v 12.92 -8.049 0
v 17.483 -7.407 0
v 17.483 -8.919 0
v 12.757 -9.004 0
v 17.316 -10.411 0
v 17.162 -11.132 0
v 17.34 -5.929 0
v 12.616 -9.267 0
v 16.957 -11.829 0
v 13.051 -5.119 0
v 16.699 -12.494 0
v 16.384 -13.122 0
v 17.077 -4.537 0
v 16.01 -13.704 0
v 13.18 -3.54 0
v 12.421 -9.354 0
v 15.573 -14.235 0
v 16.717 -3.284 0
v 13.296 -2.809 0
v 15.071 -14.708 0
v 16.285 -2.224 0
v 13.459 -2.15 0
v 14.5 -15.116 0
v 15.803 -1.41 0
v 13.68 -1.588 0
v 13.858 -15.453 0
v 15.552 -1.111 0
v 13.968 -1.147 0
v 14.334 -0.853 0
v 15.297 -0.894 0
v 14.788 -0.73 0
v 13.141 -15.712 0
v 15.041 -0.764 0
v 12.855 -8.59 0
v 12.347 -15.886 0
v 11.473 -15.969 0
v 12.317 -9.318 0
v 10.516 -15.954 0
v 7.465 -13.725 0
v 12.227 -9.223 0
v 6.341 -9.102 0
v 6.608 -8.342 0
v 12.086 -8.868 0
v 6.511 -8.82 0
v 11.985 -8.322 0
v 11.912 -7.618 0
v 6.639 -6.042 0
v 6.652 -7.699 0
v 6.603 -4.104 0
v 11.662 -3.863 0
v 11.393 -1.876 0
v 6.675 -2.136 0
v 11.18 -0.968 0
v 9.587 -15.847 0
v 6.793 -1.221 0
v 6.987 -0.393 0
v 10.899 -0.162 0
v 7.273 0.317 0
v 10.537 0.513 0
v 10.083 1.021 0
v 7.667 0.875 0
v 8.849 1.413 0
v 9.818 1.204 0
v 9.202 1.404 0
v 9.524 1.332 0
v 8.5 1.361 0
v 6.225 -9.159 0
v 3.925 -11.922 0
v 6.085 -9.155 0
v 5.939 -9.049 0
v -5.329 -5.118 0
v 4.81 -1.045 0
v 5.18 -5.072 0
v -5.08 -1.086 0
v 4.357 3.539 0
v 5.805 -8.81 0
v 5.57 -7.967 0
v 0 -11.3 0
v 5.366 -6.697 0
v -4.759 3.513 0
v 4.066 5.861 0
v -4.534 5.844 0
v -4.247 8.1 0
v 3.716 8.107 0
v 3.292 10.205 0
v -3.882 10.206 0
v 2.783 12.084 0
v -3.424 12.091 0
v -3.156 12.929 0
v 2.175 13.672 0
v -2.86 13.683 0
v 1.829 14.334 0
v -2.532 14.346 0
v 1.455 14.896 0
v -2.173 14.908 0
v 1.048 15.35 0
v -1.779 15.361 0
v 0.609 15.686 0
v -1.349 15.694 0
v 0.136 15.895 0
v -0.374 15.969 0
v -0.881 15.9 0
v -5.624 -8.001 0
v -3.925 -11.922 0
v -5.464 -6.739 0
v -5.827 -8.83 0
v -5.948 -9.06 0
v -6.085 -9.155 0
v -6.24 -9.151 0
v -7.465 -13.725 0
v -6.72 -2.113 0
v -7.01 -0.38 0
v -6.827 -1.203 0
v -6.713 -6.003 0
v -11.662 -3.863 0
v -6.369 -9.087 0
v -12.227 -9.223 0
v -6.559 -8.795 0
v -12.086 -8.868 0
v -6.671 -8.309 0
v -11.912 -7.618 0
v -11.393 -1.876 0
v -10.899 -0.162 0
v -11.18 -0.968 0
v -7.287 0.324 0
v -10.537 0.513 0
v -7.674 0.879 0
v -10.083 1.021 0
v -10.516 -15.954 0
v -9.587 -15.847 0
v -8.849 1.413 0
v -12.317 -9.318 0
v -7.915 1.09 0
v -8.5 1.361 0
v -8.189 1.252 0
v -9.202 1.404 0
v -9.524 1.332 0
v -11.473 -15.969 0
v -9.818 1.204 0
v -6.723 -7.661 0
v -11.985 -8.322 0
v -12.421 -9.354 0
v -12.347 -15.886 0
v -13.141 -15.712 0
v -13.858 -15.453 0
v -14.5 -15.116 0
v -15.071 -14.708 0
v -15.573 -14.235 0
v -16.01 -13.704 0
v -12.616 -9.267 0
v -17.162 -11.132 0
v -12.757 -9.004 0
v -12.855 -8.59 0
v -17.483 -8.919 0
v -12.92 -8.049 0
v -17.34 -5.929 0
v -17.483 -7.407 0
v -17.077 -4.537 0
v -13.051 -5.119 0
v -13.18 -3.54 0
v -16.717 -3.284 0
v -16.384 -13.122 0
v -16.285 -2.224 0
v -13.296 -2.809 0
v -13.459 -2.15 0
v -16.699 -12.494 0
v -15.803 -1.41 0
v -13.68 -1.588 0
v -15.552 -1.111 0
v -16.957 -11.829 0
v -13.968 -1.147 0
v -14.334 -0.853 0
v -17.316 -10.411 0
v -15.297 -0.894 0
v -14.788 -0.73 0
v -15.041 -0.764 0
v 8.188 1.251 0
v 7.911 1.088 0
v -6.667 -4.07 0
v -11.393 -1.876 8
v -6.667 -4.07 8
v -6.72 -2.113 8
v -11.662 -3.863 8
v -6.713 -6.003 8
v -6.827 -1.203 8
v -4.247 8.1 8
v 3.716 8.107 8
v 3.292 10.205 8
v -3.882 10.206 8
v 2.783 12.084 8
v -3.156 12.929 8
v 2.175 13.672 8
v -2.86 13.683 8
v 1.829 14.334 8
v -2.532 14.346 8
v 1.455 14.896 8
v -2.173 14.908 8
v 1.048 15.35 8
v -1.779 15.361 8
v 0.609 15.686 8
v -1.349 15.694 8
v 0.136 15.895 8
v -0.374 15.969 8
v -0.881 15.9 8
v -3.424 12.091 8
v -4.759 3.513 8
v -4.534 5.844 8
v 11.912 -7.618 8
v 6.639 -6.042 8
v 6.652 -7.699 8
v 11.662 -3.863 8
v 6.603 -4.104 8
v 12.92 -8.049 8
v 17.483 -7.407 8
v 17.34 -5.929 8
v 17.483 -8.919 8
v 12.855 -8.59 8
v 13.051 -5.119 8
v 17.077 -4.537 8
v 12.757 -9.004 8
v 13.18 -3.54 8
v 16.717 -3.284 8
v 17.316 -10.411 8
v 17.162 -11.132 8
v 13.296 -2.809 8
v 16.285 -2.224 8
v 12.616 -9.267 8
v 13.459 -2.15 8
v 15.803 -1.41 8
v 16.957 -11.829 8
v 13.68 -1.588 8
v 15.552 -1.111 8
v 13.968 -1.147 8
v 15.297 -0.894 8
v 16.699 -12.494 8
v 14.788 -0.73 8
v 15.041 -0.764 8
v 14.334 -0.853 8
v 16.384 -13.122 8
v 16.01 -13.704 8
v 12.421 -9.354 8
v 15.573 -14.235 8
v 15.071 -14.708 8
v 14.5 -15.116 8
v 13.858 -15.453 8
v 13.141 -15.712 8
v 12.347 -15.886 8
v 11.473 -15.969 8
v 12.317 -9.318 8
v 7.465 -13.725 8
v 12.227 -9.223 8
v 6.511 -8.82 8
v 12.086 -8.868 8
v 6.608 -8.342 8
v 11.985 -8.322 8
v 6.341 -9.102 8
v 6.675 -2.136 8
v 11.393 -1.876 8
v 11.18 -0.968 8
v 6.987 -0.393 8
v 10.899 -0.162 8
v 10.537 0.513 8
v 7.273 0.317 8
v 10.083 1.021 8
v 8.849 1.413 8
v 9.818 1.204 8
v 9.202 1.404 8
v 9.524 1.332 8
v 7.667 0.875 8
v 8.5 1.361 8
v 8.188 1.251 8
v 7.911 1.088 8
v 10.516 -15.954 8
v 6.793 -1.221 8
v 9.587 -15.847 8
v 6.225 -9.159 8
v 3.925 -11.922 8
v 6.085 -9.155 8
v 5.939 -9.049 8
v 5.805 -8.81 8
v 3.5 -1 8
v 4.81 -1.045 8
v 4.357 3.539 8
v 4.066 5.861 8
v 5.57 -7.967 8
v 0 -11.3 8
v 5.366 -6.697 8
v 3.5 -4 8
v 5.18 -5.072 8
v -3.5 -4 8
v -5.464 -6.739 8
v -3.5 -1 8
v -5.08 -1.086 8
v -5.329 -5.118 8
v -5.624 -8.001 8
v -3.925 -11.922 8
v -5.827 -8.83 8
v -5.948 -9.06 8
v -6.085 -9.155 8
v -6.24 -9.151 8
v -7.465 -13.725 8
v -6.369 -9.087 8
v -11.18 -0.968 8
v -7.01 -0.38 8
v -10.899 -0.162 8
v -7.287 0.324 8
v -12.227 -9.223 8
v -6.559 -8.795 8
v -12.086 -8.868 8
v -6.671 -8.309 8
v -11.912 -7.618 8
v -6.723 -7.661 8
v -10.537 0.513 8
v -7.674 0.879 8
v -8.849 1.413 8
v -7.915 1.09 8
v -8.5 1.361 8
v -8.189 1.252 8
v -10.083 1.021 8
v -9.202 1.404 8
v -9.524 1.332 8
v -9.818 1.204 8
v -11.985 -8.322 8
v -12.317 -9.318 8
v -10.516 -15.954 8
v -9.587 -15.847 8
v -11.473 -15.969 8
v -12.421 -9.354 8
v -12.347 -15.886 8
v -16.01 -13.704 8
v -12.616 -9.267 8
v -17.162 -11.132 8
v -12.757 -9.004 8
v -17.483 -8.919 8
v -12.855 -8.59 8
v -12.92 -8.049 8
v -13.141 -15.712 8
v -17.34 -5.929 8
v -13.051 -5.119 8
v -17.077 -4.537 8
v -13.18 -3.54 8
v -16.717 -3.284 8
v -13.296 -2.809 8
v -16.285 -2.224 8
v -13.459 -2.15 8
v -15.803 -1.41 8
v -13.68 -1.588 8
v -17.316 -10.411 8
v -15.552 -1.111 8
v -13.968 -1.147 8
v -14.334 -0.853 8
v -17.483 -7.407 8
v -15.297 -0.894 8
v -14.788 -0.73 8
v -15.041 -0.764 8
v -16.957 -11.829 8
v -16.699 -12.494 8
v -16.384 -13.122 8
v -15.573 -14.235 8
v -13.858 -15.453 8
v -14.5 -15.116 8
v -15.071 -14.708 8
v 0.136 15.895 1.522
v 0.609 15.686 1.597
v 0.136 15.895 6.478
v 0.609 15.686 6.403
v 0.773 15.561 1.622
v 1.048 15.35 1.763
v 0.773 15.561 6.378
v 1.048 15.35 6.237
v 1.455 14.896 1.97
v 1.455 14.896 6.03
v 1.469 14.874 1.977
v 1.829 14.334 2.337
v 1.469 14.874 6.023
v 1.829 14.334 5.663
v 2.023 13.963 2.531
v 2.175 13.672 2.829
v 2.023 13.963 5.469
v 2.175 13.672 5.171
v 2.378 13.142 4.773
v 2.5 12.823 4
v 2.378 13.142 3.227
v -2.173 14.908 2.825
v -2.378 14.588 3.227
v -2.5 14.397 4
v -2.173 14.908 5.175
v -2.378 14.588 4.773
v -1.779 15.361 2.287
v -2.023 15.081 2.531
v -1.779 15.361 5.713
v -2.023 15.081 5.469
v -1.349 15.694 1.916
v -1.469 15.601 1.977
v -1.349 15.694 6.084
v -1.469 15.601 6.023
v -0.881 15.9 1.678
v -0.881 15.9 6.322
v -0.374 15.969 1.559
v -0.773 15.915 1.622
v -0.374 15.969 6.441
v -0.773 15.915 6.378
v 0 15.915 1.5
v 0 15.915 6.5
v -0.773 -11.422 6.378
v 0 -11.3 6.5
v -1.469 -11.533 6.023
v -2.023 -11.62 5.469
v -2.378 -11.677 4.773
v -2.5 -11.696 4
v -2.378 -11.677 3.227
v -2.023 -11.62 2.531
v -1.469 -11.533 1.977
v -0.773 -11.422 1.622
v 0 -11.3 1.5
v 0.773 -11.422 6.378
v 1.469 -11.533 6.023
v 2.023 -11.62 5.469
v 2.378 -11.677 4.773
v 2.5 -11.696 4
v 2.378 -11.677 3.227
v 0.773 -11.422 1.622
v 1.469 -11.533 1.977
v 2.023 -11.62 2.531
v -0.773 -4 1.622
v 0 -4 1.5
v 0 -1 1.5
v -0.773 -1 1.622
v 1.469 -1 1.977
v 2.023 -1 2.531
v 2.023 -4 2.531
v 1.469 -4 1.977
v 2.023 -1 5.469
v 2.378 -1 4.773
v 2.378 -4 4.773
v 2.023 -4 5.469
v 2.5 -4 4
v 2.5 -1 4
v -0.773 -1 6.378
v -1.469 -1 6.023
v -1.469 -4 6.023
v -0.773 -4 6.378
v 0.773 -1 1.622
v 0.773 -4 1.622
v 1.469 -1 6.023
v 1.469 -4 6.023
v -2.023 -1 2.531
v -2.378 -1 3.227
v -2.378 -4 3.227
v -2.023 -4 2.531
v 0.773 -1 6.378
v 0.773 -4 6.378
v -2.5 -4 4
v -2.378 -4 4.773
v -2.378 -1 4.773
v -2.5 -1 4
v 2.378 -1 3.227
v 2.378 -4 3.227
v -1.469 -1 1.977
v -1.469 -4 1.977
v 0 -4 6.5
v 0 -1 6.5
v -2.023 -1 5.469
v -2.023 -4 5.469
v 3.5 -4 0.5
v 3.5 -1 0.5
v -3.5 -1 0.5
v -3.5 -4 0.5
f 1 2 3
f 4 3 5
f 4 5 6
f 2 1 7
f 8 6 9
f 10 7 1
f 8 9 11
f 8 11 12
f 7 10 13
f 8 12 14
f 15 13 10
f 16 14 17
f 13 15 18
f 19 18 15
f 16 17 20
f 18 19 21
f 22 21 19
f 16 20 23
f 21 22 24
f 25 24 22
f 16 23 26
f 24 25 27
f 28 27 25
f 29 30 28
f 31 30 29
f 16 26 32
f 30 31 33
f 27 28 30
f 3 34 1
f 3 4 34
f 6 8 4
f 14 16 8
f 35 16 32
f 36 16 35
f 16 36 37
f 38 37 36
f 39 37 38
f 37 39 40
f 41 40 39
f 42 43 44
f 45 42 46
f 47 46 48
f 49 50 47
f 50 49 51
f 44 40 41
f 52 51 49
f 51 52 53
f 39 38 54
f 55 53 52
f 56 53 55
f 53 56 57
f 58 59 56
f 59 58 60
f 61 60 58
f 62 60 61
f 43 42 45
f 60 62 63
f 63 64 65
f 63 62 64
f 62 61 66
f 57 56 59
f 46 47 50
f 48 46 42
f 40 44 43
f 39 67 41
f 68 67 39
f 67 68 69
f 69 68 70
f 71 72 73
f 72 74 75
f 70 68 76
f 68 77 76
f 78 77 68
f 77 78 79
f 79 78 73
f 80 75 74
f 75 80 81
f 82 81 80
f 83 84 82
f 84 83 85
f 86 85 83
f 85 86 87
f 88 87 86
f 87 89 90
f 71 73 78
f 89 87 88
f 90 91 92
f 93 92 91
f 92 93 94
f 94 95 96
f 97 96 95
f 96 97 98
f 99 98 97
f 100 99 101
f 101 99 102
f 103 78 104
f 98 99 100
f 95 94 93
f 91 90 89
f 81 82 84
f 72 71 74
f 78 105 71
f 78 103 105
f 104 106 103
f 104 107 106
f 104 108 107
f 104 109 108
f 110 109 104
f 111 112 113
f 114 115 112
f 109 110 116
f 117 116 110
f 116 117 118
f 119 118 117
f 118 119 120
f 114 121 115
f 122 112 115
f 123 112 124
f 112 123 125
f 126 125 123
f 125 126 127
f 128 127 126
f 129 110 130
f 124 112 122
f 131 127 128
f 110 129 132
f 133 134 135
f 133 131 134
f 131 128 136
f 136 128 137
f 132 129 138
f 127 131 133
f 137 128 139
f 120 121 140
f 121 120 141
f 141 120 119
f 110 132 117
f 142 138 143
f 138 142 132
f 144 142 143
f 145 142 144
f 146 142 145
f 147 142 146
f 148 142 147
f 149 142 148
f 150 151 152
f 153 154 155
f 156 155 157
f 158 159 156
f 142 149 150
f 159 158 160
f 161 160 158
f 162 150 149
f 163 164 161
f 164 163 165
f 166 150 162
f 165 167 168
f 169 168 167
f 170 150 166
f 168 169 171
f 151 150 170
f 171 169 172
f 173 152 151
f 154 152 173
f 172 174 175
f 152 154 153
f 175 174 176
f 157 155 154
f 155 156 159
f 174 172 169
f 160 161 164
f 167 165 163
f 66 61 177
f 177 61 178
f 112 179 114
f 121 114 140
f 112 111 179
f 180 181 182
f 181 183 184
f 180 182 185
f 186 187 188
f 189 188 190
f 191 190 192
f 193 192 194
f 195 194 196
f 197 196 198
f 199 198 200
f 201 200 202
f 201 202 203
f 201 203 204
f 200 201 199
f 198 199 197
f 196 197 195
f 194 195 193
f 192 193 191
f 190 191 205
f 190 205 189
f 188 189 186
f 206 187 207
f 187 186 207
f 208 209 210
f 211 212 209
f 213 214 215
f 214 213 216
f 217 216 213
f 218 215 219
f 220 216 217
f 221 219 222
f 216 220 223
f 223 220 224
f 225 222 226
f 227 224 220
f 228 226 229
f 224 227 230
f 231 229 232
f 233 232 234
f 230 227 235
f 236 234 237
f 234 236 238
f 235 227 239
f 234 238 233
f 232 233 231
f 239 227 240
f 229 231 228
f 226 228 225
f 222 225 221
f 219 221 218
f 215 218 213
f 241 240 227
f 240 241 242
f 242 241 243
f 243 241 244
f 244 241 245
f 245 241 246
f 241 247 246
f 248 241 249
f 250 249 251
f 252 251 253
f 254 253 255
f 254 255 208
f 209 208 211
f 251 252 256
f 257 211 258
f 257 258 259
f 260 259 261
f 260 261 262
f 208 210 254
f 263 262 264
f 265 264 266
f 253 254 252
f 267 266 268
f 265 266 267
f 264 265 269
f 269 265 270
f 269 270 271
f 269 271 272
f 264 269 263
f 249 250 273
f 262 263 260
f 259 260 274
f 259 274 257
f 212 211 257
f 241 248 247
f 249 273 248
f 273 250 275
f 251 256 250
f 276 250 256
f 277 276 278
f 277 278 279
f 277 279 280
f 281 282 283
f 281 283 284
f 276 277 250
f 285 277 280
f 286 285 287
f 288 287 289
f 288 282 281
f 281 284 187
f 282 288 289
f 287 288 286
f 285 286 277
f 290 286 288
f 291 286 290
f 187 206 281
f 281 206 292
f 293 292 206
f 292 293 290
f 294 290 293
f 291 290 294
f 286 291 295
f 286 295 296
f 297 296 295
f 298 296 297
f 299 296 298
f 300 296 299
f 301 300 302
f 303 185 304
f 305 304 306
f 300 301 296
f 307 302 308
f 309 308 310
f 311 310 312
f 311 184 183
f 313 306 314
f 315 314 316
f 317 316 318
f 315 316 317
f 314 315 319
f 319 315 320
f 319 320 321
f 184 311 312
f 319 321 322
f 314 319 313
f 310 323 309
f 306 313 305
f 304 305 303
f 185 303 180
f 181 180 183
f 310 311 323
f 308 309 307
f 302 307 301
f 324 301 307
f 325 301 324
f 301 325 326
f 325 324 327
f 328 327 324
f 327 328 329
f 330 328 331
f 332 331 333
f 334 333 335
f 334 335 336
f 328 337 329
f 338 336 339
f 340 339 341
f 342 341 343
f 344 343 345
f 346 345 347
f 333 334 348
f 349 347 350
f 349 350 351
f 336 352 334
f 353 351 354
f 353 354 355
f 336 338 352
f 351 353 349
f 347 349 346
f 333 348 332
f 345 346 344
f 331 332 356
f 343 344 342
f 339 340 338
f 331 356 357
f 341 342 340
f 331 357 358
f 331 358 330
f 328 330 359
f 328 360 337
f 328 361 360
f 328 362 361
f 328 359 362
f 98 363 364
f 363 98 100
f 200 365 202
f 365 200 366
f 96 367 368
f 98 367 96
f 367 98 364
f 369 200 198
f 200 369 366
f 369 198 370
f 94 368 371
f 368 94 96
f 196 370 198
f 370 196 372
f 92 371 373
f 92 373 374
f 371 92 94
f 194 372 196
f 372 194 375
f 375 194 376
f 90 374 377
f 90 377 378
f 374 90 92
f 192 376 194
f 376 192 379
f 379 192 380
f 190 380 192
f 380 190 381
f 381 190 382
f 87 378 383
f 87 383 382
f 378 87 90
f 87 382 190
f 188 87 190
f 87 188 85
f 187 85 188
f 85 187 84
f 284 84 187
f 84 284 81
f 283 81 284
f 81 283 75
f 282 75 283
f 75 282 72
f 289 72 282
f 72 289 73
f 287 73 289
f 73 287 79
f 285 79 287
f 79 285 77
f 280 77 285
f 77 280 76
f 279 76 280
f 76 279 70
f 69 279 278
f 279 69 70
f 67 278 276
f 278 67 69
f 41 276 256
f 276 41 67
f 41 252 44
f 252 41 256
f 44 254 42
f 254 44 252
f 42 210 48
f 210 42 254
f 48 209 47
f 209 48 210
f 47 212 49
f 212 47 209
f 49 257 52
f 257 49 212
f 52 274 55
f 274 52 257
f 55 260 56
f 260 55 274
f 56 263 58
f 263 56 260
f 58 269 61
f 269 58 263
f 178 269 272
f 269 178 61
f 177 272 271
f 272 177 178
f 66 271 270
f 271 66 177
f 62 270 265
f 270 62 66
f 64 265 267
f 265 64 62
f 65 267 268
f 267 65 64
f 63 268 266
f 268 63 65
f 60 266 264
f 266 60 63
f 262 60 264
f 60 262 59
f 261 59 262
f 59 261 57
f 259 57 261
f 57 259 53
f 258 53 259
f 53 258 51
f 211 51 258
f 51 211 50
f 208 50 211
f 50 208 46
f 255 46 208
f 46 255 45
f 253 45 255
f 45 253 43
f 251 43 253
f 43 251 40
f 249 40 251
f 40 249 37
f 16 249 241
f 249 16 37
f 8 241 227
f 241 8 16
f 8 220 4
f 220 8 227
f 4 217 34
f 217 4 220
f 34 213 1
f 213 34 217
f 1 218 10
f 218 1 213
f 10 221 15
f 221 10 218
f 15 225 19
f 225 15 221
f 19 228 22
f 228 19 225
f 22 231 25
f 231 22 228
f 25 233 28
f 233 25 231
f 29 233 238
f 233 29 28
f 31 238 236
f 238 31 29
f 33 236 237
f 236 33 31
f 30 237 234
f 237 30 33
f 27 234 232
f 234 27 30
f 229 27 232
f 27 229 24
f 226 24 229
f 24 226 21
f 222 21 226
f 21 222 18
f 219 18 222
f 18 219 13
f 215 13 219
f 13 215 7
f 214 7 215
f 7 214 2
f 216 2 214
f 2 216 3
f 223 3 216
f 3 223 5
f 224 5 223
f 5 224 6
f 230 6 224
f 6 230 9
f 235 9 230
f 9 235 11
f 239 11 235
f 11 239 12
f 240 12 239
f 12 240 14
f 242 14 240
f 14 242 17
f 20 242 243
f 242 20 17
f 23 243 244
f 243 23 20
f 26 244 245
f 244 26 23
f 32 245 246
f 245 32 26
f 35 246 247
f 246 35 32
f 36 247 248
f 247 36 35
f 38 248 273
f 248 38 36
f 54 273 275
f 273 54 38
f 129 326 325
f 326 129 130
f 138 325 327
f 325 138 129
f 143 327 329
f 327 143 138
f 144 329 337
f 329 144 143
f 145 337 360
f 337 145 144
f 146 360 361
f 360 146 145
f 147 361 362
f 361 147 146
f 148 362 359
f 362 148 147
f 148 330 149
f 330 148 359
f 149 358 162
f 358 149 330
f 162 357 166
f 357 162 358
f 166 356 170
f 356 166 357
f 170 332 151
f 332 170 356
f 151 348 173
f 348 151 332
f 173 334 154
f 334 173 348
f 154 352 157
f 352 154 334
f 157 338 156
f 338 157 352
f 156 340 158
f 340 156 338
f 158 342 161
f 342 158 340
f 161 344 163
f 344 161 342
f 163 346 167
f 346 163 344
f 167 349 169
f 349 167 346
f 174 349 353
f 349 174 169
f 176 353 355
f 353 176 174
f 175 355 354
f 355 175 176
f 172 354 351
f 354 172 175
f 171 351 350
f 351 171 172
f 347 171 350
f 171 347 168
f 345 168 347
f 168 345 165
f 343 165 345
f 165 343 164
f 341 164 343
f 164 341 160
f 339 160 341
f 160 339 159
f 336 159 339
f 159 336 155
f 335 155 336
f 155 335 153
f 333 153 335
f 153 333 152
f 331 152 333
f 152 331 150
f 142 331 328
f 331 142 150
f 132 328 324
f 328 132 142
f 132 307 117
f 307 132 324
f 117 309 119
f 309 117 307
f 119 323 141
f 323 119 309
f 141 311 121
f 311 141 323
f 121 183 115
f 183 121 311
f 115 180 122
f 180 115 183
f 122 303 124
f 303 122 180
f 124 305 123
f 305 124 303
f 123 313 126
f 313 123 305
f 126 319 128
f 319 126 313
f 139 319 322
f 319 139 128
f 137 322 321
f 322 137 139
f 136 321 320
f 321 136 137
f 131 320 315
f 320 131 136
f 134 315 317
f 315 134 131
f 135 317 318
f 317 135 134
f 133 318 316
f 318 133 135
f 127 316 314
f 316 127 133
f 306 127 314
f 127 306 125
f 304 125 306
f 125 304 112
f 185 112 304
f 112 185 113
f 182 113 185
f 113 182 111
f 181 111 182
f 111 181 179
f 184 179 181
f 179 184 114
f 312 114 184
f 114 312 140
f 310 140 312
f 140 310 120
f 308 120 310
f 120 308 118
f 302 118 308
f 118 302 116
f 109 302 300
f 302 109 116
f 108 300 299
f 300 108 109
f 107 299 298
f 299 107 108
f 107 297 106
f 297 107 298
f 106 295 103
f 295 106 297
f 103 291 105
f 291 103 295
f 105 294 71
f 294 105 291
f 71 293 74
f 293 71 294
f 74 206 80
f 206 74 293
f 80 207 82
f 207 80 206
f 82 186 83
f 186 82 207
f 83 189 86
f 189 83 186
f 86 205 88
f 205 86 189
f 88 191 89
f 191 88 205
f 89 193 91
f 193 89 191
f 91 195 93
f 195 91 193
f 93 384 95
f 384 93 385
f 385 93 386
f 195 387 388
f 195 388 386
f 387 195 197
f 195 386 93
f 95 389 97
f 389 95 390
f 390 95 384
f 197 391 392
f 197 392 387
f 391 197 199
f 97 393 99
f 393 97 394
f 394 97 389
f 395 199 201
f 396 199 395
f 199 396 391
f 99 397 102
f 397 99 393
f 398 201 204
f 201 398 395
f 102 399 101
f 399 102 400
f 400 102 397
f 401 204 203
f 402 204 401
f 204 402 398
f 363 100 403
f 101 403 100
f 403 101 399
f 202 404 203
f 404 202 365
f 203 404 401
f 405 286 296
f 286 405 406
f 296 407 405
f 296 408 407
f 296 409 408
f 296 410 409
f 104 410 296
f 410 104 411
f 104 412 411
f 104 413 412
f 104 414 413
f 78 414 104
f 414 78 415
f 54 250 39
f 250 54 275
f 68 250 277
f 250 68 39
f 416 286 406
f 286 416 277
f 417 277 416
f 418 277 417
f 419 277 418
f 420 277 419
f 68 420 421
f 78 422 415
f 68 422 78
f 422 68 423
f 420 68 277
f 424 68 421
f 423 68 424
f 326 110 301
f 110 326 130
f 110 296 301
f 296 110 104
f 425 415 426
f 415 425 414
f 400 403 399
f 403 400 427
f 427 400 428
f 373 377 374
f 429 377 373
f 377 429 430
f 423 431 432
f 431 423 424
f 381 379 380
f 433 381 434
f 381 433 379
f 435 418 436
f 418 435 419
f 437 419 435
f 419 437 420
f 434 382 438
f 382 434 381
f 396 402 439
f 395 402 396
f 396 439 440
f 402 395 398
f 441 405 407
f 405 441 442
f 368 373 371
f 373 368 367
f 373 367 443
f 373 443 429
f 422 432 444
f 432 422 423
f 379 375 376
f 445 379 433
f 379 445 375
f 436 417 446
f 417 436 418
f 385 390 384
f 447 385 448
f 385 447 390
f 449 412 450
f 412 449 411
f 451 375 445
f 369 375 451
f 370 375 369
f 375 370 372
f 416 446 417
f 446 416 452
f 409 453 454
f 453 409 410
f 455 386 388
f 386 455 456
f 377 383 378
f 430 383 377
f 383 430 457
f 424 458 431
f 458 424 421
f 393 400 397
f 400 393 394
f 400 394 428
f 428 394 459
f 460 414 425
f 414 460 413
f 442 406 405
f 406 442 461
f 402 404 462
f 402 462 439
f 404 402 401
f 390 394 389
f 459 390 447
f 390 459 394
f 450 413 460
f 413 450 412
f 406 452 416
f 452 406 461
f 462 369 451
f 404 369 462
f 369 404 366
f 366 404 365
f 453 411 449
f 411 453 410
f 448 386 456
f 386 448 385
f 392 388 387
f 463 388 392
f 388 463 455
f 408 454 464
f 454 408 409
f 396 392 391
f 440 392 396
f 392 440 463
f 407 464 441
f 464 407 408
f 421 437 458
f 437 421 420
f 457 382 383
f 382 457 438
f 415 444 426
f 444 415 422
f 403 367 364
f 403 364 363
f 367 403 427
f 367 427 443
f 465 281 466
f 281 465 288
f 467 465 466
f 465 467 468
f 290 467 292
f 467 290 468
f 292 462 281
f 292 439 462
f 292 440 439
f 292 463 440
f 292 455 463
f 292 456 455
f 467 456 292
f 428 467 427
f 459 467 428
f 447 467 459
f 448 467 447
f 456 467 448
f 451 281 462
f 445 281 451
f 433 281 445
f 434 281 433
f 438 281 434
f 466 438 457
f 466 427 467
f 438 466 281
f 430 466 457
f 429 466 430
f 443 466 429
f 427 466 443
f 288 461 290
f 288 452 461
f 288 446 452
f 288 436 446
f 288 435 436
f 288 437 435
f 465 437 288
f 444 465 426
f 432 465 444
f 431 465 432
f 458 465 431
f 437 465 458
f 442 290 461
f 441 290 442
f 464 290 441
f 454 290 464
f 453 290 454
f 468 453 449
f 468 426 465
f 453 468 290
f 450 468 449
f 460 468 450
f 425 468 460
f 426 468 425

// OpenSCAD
// fudge value is used to ensure that subtracted solids are a tad taller
// in the z dimension than the polygon being subtracted from.  This helps
// keep the resulting .stl file manifold.
fudge = 0.1;

//Smoothing
$fn=20;

//Height
hi = 8;

//Radius of the bars
bar_radius = 25.4 / 2;

//Bar notch shift to tweak (-18)
notch_shift = -24;

//Bolt length (whatever)
bolt_length = 200;

//Bolt radius
bolt_radius = 5 / 2;

//Nut thickness
nut_thick = 3;

//Nut width
nut_width = 7;

//Scale along x (0.35)
x_squish = 0.65;

//Scale along y (0.5)
y_squish = 0.7;


module poly_path4211(h) //Curvy bit drawn as vector and exported with https://www.thingiverse.com/thing:25036
{
  scale([25.4/90, -25.4/90, 1]) union()
  {
    linear_extrude(height=h)
      polygon([[-2.036737,-80.831214],[-4.804049,-80.483477],[-7.354371,-79.442278],[-9.697826,-77.753565],[-11.844536,-75.463291],[-13.804622,-72.617405],[-15.588208,-69.261857],[-17.205416,-65.442598],[-18.666366,-61.205579],[-21.159987,-51.662062],[-23.150049,-40.998907],[-24.717528,-29.583720],[-25.943402,-17.784104],[-27.694246,5.498003],[-29.050400,25.906584],[-29.782912,34.114294],[-30.659684,40.500811],[-31.761693,44.698533],[-32.422467,45.861720],[-33.169917,46.339856],[-34.015778,46.320631],[-34.720894,45.997372],[-35.755512,44.517718],[-36.367014,42.058833],[-36.648641,38.778657],[-36.595244,30.386189],[-36.341261,20.603827],[-36.632632,10.695085],[-37.215932,6.088169],[-38.215299,1.923477],[-39.723974,-1.641055],[-41.835200,-4.447484],[-43.145908,-5.517055],[-44.642220,-6.337874],[-46.335792,-6.890198],[-48.238277,-7.154284],[-50.162748,-7.105030],[-51.919994,-6.744155],[-53.518247,-6.092151],[-54.965741,-5.169509],[-57.441377,-2.594272],[-59.412763,0.817624],[-60.945758,4.902250],[-62.106224,9.495679],[-63.573005,19.553224],[-64.934048,38.561047],[-65.330884,42.126069],[-65.882071,44.888459],[-66.653469,46.684288],[-67.142328,47.168514],[-67.710937,47.349626],[-68.770178,46.908037],[-69.539578,45.576012],[-70.074026,43.479020],[-70.428410,40.742527],[-71.143062,25.910875],[-71.847091,17.920174],[-72.477889,14.220239],[-73.367727,10.884536],[-74.571492,8.038531],[-76.144074,5.807692],[-78.140360,4.317485],[-80.615237,3.693376],[-81.993758,3.869341],[-83.386104,4.524072],[-84.776158,5.623975],[-86.147801,7.135450],[-88.771377,11.258730],[-91.127883,16.625135],[-93.088369,22.965886],[-94.523884,30.012205],[-95.305480,37.495314],[-95.304206,45.146434],[-94.391112,52.696787],[-93.552336,56.350182],[-92.437249,59.877594],[-91.029732,63.245425],[-89.313666,66.420078],[-87.272933,69.367956],[-84.891414,72.055461],[-82.152990,74.448996],[-79.041543,76.514963],[-75.540954,78.219766],[-71.635103,79.529807],[-67.307873,80.411489],[-62.543144,80.831214],[-57.324799,80.755386],[-51.636717,80.150406],[-45.939384,78.357846],[-40.062604,77.046858],[-33.992430,76.106380],[-27.714916,75.425347],[-14.482083,74.397366],[-0.252537,73.074406],[14.055928,74.397366],[27.462382,75.425347],[33.832625,76.106380],[39.983691,77.046858],[45.917688,78.357846],[51.636723,80.150406],[57.324805,80.755386],[62.543150,80.831214],[67.307879,80.411489],[71.635109,79.529807],[75.540959,78.219766],[79.041548,76.514963],[82.152995,74.448996],[84.891418,72.055461],[87.272937,69.367956],[89.313670,66.420078],[91.029735,63.245425],[92.437251,59.877594],[93.552338,56.350182],[94.391114,52.696787],[95.304207,45.146434],[95.305480,37.495314],[94.523883,30.012205],[93.088367,22.965886],[91.127881,16.625135],[88.771374,11.258730],[86.147797,7.135450],[84.776155,5.623975],[83.386100,4.524072],[81.993754,3.869341],[80.615233,3.693376],[78.140356,4.317485],[76.144070,5.807692],[74.571488,8.038531],[73.367723,10.884536],[72.477885,14.220239],[71.847087,17.920174],[71.143059,25.910875],[70.428410,40.742527],[70.074027,43.479020],[69.539581,45.576012],[68.770182,46.908037],[67.710943,47.349626],[67.142333,47.168514],[66.653473,46.684288],[65.882074,44.888459],[65.330886,42.126069],[64.934049,38.561047],[63.573007,19.553224],[62.106227,9.495679],[60.945762,4.902250],[59.412767,0.817624],[57.441382,-2.594272],[54.965746,-5.169509],[53.518253,-6.092151],[51.920000,-6.744155],[50.162754,-7.105030],[48.238283,-7.154284],[46.333177,-6.888917],[44.632083,-6.332918],[43.123853,-5.506277],[41.797338,-4.428984],[39.644863,-1.602402],[38.085471,1.986907],[37.029979,6.179020],[36.389201,10.814017],[35.995044,20.772975],[36.189520,30.584409],[36.259147,38.968948],[36.024178,42.226329],[35.490441,44.647221],[34.568752,46.071704],[33.934554,46.360317],[33.169923,46.339856],[32.373811,45.804996],[31.646692,44.594018],[30.363991,40.325401],[29.250930,33.897391],[28.236618,25.673373],[26.220681,5.290854],[23.749059,-17.915073],[22.165140,-29.668351],[20.254629,-41.037325],[17.946635,-51.658611],[15.170267,-61.168821],[11.854637,-69.204572],[9.972445,-72.555968],[7.928853,-75.402478],[5.715000,-77.698681],[3.322025,-79.399154],[0.741066,-80.458472],[-2.036737,-80.831214]]);
  }
}



difference(){
    //Bring in the polygon from Inkscape with arbitrary scale...
    scale([x_squish,y_squish,1]) poly_path4211(hi);

    //Notch out for common bar diameters 
    translate([0,notch_shift,0]) #cylinder(h=hi, r=bar_radius);
    
    //Notch out for bolt
    translate ([0,0,hi/2]) rotate([90,0,0]) #cylinder(h=bolt_length, r=bolt_radius, center=true);
    
    //Notch out for nut trap
    translate ([-nut_width/2,-4,(hi-nut_width)/2]) #cube([nut_width,nut_thick,bolt_length]);
    
}//end difference
